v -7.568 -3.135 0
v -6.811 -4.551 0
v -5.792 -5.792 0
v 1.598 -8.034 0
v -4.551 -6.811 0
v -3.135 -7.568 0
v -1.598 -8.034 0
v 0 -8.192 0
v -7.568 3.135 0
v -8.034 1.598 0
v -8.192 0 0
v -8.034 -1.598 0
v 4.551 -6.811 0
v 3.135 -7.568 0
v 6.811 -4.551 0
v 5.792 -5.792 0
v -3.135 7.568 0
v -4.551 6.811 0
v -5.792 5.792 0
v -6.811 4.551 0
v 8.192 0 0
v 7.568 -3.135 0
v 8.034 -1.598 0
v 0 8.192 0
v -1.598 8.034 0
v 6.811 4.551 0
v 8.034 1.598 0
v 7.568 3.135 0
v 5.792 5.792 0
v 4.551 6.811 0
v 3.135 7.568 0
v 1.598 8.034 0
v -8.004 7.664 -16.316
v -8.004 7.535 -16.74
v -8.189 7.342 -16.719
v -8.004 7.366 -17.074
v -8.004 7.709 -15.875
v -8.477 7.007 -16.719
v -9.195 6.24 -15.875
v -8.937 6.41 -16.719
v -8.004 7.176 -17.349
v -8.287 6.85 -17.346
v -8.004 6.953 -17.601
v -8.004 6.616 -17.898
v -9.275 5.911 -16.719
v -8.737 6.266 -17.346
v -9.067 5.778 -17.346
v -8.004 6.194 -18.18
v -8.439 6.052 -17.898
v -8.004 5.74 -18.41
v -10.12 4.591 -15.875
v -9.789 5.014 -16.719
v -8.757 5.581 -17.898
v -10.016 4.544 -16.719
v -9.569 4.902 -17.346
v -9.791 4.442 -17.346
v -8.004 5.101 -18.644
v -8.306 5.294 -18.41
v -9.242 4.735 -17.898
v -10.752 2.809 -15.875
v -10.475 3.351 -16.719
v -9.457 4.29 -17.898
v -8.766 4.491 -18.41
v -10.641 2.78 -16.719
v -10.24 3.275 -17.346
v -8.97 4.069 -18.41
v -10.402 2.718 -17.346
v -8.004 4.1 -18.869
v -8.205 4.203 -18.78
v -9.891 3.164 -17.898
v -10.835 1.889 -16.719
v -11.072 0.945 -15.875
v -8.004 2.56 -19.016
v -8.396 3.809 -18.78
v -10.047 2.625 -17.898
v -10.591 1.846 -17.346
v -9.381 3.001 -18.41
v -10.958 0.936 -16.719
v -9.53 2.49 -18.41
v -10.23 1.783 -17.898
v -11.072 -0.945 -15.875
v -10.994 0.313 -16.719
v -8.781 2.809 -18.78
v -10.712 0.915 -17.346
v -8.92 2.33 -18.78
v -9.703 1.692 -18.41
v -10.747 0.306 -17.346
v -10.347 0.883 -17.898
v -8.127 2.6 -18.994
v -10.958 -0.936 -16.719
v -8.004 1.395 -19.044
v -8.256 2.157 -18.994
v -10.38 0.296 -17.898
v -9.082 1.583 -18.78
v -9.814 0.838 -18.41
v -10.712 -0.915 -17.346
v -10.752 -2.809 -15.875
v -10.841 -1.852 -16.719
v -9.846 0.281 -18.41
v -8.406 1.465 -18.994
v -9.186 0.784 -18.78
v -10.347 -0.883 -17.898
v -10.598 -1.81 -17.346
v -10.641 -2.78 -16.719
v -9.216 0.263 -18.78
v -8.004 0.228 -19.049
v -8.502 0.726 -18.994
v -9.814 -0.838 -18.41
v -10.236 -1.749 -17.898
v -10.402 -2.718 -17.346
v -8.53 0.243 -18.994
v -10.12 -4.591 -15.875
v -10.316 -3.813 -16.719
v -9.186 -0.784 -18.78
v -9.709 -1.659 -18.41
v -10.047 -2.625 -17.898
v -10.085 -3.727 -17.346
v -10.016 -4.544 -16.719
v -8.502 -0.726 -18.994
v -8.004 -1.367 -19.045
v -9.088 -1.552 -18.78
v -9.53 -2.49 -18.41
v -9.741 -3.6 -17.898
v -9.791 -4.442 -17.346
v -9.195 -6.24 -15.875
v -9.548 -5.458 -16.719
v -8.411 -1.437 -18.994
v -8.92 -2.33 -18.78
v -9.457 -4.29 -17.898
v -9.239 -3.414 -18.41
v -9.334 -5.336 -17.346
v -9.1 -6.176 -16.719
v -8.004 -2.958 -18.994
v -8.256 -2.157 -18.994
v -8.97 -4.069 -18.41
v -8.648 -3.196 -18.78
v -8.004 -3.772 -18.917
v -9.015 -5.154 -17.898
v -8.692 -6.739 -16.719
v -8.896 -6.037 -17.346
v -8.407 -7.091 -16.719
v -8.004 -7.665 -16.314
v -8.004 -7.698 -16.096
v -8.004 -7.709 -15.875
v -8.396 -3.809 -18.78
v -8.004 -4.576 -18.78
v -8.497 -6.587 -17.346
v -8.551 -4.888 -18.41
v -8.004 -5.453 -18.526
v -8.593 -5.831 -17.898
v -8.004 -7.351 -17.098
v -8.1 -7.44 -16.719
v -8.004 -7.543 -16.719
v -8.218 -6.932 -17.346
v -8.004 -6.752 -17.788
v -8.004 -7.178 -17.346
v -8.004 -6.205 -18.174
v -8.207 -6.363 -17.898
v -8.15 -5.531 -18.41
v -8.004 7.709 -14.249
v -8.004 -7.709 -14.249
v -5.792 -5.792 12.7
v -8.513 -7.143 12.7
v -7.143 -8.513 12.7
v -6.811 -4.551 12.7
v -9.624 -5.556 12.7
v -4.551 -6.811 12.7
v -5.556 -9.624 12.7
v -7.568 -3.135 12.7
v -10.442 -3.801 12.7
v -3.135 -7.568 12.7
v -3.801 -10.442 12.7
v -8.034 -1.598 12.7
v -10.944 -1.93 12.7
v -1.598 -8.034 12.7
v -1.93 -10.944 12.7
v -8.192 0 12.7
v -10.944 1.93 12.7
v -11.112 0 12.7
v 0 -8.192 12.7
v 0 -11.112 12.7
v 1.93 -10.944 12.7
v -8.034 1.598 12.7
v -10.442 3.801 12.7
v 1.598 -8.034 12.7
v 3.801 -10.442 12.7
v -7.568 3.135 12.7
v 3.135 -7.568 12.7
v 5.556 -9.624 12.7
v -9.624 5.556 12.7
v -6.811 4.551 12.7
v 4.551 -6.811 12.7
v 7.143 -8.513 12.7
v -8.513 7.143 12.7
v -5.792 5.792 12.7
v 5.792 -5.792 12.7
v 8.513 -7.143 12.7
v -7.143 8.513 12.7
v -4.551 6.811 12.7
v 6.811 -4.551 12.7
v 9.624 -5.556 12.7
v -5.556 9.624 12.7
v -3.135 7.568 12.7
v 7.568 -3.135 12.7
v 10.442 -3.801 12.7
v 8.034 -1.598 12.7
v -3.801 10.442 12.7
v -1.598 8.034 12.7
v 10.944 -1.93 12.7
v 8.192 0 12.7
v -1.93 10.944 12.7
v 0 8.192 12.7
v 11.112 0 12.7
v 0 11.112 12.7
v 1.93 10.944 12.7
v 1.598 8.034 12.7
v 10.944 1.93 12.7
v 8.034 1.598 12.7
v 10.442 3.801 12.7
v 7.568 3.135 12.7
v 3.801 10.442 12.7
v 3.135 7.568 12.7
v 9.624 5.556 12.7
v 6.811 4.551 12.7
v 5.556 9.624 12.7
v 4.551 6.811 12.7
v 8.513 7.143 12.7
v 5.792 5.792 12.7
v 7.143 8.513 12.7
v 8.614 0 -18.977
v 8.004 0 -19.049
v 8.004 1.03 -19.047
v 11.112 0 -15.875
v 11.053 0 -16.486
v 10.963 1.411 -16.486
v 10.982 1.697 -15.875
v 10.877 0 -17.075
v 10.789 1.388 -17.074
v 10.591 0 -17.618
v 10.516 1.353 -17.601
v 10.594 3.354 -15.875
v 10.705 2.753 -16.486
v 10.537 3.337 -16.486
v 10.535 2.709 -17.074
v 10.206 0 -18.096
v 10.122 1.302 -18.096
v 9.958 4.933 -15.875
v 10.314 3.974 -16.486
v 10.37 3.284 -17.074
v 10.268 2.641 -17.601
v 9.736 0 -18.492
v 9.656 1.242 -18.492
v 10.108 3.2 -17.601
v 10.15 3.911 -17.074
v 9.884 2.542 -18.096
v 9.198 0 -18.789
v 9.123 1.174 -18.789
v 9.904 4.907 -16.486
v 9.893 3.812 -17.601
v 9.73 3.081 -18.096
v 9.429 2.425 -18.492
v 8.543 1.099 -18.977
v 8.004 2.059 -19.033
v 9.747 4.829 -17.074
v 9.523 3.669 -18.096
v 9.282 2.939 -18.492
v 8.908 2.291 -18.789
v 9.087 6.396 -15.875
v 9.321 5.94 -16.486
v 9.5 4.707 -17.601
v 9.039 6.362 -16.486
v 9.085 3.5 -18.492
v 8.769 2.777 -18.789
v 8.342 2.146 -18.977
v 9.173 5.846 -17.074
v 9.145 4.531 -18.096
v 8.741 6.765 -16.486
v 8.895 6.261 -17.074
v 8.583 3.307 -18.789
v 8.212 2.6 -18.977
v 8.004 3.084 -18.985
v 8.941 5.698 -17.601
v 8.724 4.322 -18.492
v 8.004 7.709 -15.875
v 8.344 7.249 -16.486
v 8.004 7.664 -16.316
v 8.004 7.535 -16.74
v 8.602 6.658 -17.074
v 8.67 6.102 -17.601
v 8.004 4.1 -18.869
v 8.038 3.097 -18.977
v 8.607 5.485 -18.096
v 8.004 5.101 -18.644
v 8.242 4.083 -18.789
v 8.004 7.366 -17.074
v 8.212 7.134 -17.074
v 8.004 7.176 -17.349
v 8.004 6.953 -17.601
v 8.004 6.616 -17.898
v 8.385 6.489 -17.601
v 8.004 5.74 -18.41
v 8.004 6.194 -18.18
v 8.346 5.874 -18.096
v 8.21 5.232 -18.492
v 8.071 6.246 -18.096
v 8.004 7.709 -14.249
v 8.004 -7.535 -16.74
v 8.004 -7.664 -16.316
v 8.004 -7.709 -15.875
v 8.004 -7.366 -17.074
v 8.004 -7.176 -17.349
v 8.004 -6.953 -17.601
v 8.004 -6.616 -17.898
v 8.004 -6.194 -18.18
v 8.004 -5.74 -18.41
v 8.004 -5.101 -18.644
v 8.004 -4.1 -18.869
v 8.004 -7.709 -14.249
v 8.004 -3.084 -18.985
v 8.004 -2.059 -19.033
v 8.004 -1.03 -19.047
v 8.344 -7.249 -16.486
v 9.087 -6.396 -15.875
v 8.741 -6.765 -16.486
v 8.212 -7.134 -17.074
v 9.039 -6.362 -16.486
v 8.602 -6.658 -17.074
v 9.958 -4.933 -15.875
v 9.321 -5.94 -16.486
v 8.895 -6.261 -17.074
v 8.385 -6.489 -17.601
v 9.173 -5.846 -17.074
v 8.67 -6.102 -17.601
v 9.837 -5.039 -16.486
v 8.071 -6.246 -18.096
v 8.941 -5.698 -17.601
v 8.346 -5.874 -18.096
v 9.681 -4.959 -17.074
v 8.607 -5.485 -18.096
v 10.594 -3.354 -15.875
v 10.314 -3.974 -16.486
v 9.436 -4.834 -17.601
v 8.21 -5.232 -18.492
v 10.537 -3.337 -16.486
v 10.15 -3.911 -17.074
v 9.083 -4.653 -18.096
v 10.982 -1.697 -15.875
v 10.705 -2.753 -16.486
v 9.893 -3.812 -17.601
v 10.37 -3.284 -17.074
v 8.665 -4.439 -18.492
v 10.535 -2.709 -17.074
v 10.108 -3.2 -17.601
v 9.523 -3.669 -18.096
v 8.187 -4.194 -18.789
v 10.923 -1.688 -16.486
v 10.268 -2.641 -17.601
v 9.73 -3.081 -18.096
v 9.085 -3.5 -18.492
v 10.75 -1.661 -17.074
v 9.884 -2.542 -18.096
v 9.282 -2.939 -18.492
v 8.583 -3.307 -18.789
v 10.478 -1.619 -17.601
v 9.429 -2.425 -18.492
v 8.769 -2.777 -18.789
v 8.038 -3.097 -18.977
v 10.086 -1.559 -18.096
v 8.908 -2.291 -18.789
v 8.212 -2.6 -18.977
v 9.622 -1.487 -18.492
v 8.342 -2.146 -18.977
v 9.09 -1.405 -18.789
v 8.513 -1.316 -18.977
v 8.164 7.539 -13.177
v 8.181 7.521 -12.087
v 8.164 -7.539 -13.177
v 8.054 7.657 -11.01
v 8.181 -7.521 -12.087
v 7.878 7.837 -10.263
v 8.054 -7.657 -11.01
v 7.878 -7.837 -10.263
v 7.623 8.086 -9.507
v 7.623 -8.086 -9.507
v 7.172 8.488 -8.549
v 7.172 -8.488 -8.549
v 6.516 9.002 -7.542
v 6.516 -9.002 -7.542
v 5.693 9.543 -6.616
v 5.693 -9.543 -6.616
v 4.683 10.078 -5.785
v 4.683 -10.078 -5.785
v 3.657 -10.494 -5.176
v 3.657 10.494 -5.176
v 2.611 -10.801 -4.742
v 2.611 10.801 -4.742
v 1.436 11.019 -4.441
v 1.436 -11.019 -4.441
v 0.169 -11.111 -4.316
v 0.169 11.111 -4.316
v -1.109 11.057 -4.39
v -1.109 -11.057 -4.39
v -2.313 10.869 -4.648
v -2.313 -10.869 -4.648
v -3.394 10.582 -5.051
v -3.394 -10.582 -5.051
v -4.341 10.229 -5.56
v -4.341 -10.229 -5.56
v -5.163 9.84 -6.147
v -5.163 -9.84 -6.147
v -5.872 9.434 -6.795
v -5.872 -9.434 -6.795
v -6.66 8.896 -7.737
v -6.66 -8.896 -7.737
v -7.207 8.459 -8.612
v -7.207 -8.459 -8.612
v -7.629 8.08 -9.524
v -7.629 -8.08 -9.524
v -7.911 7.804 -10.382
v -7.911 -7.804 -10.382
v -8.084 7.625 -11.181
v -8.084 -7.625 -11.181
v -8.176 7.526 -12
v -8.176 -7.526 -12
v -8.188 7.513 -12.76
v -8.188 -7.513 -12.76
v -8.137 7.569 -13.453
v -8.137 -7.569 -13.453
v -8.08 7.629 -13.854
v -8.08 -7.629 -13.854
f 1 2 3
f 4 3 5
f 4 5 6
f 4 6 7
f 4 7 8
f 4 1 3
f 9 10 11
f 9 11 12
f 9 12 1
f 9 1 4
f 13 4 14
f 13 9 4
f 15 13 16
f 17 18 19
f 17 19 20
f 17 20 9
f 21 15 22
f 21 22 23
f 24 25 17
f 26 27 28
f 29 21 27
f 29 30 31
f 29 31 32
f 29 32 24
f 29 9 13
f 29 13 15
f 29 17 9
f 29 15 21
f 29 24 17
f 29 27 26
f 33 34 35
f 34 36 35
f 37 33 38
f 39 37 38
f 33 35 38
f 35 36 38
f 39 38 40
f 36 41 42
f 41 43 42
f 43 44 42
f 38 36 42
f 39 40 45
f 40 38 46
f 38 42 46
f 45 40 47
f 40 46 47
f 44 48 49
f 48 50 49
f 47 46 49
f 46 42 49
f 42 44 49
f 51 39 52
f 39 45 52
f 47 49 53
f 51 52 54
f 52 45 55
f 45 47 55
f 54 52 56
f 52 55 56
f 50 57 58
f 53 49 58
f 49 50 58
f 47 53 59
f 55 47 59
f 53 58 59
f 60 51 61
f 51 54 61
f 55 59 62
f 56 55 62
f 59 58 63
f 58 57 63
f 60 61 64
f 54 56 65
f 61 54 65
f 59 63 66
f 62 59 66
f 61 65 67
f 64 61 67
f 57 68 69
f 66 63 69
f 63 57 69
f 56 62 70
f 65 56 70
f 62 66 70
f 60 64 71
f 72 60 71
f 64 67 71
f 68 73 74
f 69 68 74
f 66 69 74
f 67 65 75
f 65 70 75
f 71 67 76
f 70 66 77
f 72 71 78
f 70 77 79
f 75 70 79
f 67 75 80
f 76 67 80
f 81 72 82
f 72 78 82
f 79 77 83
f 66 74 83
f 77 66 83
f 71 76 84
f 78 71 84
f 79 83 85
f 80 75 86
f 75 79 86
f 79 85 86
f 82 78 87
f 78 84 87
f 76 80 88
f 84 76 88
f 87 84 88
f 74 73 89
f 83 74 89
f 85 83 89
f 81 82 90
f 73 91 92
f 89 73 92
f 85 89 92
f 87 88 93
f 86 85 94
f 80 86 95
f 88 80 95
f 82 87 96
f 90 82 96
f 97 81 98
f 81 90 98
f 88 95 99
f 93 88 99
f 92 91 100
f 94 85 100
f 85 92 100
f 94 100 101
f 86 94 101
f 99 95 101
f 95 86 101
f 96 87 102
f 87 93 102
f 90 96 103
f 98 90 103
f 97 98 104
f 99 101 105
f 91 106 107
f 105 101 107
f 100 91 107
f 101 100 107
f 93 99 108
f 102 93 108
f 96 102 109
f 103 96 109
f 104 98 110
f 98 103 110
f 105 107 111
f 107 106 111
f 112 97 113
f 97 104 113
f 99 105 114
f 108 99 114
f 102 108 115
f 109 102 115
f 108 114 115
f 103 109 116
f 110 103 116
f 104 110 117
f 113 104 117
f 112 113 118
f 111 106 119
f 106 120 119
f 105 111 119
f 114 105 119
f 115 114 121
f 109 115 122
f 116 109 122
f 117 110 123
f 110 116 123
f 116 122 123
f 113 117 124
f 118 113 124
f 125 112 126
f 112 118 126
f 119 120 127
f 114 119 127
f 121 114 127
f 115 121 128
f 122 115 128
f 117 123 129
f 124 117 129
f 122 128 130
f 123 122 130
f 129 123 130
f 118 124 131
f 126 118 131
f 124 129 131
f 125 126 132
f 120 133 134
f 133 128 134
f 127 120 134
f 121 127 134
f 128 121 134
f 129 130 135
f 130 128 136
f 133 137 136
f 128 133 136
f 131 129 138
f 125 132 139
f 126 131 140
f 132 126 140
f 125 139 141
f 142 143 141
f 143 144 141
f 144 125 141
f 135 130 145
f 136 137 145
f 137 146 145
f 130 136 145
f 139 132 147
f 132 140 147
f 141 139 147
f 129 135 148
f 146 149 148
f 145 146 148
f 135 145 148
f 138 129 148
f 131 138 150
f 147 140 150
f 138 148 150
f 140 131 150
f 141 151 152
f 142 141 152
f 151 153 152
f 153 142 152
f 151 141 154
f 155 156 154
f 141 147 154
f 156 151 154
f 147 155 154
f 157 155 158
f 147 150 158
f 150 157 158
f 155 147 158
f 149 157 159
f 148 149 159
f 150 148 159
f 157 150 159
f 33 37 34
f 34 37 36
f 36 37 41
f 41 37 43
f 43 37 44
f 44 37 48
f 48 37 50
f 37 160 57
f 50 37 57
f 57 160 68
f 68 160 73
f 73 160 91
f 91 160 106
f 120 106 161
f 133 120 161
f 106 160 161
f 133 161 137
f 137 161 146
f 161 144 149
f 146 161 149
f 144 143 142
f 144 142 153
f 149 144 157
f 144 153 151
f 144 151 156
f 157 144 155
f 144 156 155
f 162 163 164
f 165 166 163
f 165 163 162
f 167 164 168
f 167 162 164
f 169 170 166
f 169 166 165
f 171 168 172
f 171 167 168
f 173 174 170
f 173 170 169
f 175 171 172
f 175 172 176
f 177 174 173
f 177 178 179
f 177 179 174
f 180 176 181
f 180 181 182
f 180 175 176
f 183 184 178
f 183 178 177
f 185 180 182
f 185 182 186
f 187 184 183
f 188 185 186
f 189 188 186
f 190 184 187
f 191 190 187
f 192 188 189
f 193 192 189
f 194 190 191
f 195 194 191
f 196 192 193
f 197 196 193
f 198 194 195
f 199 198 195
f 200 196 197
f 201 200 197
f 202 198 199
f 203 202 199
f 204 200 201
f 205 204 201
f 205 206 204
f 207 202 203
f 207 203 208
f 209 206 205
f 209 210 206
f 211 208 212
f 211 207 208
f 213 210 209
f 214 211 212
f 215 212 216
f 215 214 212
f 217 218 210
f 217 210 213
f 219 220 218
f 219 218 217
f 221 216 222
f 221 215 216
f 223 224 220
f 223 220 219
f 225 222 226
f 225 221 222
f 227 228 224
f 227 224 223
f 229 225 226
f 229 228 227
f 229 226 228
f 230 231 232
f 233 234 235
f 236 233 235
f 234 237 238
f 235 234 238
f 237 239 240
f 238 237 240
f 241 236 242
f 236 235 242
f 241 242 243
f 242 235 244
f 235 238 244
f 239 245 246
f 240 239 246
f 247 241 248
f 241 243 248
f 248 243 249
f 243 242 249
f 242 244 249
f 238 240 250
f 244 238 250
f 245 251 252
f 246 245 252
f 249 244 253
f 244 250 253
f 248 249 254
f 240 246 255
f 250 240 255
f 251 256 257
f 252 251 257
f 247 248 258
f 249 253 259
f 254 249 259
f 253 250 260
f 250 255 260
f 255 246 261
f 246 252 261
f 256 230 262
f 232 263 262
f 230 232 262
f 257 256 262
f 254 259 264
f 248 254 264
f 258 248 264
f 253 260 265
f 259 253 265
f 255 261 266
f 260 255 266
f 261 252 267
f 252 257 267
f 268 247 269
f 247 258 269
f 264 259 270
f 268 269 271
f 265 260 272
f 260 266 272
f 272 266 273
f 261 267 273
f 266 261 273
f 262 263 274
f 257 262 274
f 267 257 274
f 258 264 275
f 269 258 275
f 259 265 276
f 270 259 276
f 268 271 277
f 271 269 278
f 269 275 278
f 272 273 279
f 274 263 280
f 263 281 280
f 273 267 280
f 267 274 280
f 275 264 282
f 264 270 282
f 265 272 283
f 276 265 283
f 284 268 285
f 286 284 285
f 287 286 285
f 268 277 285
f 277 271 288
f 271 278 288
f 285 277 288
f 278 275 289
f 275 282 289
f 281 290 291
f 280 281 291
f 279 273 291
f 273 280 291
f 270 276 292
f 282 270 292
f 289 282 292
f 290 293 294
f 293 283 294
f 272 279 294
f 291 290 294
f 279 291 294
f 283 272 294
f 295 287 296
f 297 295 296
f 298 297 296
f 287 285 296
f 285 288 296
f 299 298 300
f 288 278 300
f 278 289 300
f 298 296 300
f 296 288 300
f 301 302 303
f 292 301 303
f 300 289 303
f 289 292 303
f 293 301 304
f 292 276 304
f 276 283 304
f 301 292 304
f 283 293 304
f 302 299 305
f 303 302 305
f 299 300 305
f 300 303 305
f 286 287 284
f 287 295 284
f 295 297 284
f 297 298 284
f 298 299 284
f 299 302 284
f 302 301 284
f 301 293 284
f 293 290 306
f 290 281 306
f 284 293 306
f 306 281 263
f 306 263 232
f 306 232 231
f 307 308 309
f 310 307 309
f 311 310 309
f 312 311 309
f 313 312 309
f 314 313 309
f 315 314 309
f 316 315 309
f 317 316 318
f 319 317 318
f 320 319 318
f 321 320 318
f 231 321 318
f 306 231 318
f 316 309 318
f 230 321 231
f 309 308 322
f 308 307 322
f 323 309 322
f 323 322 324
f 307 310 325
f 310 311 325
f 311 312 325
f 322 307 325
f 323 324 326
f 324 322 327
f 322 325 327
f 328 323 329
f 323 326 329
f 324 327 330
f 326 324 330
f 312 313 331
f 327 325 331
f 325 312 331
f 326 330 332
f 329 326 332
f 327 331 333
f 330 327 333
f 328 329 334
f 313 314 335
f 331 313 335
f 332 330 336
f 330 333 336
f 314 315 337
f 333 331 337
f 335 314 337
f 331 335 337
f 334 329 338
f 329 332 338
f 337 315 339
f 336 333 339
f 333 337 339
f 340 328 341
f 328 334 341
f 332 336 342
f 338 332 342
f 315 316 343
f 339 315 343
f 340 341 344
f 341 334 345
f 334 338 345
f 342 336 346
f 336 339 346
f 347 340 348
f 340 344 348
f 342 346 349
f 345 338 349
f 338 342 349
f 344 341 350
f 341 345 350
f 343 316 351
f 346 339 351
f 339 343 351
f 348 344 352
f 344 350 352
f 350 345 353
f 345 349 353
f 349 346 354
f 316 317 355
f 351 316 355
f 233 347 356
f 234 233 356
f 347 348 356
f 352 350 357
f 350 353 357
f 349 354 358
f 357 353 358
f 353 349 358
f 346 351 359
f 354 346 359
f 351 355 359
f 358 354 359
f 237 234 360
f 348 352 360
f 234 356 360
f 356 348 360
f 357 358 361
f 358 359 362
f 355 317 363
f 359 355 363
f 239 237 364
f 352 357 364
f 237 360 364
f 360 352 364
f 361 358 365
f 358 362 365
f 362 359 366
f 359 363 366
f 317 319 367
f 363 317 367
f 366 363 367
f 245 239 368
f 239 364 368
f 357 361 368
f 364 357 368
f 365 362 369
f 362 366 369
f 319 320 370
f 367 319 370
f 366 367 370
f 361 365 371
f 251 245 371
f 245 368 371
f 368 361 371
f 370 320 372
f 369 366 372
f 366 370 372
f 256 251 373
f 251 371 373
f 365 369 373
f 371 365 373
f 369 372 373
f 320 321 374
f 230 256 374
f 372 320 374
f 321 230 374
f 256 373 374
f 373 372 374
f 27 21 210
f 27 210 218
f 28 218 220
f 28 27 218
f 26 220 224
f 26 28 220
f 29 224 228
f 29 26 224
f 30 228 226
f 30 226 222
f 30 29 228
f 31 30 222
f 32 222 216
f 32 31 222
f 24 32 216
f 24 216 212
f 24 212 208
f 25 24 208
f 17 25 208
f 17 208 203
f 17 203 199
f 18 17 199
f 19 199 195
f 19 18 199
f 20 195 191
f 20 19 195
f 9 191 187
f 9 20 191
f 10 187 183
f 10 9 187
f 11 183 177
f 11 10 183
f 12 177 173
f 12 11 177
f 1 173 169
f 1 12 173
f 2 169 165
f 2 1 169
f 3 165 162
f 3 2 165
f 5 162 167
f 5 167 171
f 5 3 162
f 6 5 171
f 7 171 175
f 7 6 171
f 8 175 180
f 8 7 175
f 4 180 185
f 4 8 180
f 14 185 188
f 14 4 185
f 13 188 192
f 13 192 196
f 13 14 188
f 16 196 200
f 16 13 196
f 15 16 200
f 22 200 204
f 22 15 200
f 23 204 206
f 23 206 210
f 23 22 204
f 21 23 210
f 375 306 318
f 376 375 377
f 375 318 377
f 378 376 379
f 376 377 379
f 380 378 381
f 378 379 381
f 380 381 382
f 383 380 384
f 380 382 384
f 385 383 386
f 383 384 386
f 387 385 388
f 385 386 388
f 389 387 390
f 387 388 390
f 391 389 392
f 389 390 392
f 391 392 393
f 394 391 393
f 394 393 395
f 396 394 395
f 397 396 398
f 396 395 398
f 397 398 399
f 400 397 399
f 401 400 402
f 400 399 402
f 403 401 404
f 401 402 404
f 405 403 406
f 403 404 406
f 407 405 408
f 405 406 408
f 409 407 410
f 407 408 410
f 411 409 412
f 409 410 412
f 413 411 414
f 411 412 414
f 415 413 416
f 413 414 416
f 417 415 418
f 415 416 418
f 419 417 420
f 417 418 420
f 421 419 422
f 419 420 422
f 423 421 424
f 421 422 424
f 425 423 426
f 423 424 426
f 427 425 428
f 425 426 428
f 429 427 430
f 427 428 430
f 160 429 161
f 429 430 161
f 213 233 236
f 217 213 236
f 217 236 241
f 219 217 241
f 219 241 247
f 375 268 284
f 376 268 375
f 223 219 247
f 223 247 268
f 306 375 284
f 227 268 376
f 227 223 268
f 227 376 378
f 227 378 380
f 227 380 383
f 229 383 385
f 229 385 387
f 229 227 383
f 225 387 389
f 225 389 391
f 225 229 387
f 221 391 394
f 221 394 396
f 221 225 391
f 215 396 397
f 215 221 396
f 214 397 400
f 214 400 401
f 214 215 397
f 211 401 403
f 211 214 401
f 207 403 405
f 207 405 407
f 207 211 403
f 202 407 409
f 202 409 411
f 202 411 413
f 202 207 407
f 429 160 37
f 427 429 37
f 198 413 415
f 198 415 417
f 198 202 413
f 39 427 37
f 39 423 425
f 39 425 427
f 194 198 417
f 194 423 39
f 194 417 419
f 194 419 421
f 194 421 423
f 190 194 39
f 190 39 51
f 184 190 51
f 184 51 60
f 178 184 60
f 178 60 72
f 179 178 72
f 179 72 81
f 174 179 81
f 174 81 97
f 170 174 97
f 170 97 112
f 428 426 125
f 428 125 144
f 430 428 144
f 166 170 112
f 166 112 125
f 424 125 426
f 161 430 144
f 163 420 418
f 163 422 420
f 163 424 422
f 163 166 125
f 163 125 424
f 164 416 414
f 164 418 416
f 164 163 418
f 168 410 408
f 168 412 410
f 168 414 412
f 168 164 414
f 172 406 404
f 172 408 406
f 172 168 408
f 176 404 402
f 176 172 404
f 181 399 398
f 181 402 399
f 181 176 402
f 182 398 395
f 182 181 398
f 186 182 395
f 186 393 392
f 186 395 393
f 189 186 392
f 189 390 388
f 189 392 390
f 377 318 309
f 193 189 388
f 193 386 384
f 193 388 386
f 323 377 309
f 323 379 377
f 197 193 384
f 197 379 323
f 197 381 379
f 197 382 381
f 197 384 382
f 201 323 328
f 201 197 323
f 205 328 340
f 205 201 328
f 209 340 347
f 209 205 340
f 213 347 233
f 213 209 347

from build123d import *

# Parameters (mm, degrees)
F0_R        = 11.1125
F0_R_2      = 8.1915
F1_DEPTH    = 12.7
F2_R        = 11.1125
F3_DEPTH    = 19.05
F5_DEPTH    = 19.05
F6_T2_ANGLE = 169.7302536888
F6_T4_ANGLE = 84.8533787692
F6_T6_ANGLE = 84.8533787692


# Not quite as in the source:
# - a fillet or chamfer that OpenCascade refuses, or shapes differently, is made with other operations: its cross-section is extruded or revolved along the edge and cut away or added


with BuildPart() as f1:
    # F0 (on Top) → F1 (new body)
    with BuildSketch(Plane.XY):
        Circle(F0_R)
        Circle(F0_R_2, mode=Mode.SUBTRACT)
    extrude(amount=F1_DEPTH)

    # F2 (on Top) → F3 (join)
    with BuildSketch(Plane.XY):
        Circle(F2_R)
    extrude(amount=-F3_DEPTH)

    # F4 (on Front) → F5 (cut, symmetric)
    with BuildSketch(Plane.XZ):
        with BuildLine():
            Line((8.0039083969, -20.9773854417), (8.0039083969, -14.2491279898))
            ThreePointArc((8.0039083969, -14.2491279898), (6.3788176707, -7.3669087446), (0, -4.3146068702))
            ThreePointArc((0, -4.3146068702), (-6.3788176707, -7.3669087446), (-8.0039083969, -14.2491279898))
            Line((-8.0039083969, -14.2491279898), (-8.0039083969, -20.9773854417))
            Line((-8.0039083969, -20.9773854417), (8.0039083969, -20.9773854417))
        make_face()
    extrude(amount=F5_DEPTH, both=True, mode=Mode.SUBTRACT)

    # F6: fillet of radius 3.175 on 3 edges, made by hand

    # F6_s1 → F6_t2 (revolve, cut)
    with BuildSketch(Plane(origin=(0, 0, 0), x_dir=(0, 0, 1), z_dir=(0.9959867753, 0.0895005221, 0))):
        with BuildLine():
            ThreePointArc((-15.875, -11.1125), (-18.1200640303, -10.1825640303), (-19.05, -7.9375))
            Line((-19.05, -7.9375), (-19.05, -11.1125))
            Line((-19.05, -11.1125), (-15.875, -11.1125))
        make_face()
    revolve(axis=Axis((0, 0, -19.05), (0, 0, 1)), revolution_arc=F6_T2_ANGLE, mode=Mode.SUBTRACT)

    # F6_s3 → F6_t4 (revolve, cut)
    with BuildSketch(Plane(origin=(0, 0, 0), x_dir=(0, 0, 1), z_dir=(-0.9959684029, -0.08970474, 0))):
        with BuildLine():
            ThreePointArc((-15.875, -11.1125), (-18.1200640303, -10.1825640303), (-19.05, -7.9375))
            Line((-19.05, -7.9375), (-19.05, -11.1125))
            Line((-19.05, -11.1125), (-15.875, -11.1125))
        make_face()
    revolve(axis=Axis((0, 0, -19.05), (0, 0, 1)), revolution_arc=F6_T4_ANGLE, mode=Mode.SUBTRACT)

    # F6_s5 → F6_t6 (revolve, cut)
    with BuildSketch(Plane.XZ):
        with BuildLine():
            ThreePointArc((11.1125, -15.875), (10.1825640303, -18.1200640303), (7.9375, -19.05))
            Line((7.9375, -19.05), (11.1125, -19.05))
            Line((11.1125, -19.05), (11.1125, -15.875))
        make_face()
    revolve(axis=Axis((0, 0, -19.05), (0, 0, 1)), revolution_arc=F6_T6_ANGLE, mode=Mode.SUBTRACT)


solid = f1.part
